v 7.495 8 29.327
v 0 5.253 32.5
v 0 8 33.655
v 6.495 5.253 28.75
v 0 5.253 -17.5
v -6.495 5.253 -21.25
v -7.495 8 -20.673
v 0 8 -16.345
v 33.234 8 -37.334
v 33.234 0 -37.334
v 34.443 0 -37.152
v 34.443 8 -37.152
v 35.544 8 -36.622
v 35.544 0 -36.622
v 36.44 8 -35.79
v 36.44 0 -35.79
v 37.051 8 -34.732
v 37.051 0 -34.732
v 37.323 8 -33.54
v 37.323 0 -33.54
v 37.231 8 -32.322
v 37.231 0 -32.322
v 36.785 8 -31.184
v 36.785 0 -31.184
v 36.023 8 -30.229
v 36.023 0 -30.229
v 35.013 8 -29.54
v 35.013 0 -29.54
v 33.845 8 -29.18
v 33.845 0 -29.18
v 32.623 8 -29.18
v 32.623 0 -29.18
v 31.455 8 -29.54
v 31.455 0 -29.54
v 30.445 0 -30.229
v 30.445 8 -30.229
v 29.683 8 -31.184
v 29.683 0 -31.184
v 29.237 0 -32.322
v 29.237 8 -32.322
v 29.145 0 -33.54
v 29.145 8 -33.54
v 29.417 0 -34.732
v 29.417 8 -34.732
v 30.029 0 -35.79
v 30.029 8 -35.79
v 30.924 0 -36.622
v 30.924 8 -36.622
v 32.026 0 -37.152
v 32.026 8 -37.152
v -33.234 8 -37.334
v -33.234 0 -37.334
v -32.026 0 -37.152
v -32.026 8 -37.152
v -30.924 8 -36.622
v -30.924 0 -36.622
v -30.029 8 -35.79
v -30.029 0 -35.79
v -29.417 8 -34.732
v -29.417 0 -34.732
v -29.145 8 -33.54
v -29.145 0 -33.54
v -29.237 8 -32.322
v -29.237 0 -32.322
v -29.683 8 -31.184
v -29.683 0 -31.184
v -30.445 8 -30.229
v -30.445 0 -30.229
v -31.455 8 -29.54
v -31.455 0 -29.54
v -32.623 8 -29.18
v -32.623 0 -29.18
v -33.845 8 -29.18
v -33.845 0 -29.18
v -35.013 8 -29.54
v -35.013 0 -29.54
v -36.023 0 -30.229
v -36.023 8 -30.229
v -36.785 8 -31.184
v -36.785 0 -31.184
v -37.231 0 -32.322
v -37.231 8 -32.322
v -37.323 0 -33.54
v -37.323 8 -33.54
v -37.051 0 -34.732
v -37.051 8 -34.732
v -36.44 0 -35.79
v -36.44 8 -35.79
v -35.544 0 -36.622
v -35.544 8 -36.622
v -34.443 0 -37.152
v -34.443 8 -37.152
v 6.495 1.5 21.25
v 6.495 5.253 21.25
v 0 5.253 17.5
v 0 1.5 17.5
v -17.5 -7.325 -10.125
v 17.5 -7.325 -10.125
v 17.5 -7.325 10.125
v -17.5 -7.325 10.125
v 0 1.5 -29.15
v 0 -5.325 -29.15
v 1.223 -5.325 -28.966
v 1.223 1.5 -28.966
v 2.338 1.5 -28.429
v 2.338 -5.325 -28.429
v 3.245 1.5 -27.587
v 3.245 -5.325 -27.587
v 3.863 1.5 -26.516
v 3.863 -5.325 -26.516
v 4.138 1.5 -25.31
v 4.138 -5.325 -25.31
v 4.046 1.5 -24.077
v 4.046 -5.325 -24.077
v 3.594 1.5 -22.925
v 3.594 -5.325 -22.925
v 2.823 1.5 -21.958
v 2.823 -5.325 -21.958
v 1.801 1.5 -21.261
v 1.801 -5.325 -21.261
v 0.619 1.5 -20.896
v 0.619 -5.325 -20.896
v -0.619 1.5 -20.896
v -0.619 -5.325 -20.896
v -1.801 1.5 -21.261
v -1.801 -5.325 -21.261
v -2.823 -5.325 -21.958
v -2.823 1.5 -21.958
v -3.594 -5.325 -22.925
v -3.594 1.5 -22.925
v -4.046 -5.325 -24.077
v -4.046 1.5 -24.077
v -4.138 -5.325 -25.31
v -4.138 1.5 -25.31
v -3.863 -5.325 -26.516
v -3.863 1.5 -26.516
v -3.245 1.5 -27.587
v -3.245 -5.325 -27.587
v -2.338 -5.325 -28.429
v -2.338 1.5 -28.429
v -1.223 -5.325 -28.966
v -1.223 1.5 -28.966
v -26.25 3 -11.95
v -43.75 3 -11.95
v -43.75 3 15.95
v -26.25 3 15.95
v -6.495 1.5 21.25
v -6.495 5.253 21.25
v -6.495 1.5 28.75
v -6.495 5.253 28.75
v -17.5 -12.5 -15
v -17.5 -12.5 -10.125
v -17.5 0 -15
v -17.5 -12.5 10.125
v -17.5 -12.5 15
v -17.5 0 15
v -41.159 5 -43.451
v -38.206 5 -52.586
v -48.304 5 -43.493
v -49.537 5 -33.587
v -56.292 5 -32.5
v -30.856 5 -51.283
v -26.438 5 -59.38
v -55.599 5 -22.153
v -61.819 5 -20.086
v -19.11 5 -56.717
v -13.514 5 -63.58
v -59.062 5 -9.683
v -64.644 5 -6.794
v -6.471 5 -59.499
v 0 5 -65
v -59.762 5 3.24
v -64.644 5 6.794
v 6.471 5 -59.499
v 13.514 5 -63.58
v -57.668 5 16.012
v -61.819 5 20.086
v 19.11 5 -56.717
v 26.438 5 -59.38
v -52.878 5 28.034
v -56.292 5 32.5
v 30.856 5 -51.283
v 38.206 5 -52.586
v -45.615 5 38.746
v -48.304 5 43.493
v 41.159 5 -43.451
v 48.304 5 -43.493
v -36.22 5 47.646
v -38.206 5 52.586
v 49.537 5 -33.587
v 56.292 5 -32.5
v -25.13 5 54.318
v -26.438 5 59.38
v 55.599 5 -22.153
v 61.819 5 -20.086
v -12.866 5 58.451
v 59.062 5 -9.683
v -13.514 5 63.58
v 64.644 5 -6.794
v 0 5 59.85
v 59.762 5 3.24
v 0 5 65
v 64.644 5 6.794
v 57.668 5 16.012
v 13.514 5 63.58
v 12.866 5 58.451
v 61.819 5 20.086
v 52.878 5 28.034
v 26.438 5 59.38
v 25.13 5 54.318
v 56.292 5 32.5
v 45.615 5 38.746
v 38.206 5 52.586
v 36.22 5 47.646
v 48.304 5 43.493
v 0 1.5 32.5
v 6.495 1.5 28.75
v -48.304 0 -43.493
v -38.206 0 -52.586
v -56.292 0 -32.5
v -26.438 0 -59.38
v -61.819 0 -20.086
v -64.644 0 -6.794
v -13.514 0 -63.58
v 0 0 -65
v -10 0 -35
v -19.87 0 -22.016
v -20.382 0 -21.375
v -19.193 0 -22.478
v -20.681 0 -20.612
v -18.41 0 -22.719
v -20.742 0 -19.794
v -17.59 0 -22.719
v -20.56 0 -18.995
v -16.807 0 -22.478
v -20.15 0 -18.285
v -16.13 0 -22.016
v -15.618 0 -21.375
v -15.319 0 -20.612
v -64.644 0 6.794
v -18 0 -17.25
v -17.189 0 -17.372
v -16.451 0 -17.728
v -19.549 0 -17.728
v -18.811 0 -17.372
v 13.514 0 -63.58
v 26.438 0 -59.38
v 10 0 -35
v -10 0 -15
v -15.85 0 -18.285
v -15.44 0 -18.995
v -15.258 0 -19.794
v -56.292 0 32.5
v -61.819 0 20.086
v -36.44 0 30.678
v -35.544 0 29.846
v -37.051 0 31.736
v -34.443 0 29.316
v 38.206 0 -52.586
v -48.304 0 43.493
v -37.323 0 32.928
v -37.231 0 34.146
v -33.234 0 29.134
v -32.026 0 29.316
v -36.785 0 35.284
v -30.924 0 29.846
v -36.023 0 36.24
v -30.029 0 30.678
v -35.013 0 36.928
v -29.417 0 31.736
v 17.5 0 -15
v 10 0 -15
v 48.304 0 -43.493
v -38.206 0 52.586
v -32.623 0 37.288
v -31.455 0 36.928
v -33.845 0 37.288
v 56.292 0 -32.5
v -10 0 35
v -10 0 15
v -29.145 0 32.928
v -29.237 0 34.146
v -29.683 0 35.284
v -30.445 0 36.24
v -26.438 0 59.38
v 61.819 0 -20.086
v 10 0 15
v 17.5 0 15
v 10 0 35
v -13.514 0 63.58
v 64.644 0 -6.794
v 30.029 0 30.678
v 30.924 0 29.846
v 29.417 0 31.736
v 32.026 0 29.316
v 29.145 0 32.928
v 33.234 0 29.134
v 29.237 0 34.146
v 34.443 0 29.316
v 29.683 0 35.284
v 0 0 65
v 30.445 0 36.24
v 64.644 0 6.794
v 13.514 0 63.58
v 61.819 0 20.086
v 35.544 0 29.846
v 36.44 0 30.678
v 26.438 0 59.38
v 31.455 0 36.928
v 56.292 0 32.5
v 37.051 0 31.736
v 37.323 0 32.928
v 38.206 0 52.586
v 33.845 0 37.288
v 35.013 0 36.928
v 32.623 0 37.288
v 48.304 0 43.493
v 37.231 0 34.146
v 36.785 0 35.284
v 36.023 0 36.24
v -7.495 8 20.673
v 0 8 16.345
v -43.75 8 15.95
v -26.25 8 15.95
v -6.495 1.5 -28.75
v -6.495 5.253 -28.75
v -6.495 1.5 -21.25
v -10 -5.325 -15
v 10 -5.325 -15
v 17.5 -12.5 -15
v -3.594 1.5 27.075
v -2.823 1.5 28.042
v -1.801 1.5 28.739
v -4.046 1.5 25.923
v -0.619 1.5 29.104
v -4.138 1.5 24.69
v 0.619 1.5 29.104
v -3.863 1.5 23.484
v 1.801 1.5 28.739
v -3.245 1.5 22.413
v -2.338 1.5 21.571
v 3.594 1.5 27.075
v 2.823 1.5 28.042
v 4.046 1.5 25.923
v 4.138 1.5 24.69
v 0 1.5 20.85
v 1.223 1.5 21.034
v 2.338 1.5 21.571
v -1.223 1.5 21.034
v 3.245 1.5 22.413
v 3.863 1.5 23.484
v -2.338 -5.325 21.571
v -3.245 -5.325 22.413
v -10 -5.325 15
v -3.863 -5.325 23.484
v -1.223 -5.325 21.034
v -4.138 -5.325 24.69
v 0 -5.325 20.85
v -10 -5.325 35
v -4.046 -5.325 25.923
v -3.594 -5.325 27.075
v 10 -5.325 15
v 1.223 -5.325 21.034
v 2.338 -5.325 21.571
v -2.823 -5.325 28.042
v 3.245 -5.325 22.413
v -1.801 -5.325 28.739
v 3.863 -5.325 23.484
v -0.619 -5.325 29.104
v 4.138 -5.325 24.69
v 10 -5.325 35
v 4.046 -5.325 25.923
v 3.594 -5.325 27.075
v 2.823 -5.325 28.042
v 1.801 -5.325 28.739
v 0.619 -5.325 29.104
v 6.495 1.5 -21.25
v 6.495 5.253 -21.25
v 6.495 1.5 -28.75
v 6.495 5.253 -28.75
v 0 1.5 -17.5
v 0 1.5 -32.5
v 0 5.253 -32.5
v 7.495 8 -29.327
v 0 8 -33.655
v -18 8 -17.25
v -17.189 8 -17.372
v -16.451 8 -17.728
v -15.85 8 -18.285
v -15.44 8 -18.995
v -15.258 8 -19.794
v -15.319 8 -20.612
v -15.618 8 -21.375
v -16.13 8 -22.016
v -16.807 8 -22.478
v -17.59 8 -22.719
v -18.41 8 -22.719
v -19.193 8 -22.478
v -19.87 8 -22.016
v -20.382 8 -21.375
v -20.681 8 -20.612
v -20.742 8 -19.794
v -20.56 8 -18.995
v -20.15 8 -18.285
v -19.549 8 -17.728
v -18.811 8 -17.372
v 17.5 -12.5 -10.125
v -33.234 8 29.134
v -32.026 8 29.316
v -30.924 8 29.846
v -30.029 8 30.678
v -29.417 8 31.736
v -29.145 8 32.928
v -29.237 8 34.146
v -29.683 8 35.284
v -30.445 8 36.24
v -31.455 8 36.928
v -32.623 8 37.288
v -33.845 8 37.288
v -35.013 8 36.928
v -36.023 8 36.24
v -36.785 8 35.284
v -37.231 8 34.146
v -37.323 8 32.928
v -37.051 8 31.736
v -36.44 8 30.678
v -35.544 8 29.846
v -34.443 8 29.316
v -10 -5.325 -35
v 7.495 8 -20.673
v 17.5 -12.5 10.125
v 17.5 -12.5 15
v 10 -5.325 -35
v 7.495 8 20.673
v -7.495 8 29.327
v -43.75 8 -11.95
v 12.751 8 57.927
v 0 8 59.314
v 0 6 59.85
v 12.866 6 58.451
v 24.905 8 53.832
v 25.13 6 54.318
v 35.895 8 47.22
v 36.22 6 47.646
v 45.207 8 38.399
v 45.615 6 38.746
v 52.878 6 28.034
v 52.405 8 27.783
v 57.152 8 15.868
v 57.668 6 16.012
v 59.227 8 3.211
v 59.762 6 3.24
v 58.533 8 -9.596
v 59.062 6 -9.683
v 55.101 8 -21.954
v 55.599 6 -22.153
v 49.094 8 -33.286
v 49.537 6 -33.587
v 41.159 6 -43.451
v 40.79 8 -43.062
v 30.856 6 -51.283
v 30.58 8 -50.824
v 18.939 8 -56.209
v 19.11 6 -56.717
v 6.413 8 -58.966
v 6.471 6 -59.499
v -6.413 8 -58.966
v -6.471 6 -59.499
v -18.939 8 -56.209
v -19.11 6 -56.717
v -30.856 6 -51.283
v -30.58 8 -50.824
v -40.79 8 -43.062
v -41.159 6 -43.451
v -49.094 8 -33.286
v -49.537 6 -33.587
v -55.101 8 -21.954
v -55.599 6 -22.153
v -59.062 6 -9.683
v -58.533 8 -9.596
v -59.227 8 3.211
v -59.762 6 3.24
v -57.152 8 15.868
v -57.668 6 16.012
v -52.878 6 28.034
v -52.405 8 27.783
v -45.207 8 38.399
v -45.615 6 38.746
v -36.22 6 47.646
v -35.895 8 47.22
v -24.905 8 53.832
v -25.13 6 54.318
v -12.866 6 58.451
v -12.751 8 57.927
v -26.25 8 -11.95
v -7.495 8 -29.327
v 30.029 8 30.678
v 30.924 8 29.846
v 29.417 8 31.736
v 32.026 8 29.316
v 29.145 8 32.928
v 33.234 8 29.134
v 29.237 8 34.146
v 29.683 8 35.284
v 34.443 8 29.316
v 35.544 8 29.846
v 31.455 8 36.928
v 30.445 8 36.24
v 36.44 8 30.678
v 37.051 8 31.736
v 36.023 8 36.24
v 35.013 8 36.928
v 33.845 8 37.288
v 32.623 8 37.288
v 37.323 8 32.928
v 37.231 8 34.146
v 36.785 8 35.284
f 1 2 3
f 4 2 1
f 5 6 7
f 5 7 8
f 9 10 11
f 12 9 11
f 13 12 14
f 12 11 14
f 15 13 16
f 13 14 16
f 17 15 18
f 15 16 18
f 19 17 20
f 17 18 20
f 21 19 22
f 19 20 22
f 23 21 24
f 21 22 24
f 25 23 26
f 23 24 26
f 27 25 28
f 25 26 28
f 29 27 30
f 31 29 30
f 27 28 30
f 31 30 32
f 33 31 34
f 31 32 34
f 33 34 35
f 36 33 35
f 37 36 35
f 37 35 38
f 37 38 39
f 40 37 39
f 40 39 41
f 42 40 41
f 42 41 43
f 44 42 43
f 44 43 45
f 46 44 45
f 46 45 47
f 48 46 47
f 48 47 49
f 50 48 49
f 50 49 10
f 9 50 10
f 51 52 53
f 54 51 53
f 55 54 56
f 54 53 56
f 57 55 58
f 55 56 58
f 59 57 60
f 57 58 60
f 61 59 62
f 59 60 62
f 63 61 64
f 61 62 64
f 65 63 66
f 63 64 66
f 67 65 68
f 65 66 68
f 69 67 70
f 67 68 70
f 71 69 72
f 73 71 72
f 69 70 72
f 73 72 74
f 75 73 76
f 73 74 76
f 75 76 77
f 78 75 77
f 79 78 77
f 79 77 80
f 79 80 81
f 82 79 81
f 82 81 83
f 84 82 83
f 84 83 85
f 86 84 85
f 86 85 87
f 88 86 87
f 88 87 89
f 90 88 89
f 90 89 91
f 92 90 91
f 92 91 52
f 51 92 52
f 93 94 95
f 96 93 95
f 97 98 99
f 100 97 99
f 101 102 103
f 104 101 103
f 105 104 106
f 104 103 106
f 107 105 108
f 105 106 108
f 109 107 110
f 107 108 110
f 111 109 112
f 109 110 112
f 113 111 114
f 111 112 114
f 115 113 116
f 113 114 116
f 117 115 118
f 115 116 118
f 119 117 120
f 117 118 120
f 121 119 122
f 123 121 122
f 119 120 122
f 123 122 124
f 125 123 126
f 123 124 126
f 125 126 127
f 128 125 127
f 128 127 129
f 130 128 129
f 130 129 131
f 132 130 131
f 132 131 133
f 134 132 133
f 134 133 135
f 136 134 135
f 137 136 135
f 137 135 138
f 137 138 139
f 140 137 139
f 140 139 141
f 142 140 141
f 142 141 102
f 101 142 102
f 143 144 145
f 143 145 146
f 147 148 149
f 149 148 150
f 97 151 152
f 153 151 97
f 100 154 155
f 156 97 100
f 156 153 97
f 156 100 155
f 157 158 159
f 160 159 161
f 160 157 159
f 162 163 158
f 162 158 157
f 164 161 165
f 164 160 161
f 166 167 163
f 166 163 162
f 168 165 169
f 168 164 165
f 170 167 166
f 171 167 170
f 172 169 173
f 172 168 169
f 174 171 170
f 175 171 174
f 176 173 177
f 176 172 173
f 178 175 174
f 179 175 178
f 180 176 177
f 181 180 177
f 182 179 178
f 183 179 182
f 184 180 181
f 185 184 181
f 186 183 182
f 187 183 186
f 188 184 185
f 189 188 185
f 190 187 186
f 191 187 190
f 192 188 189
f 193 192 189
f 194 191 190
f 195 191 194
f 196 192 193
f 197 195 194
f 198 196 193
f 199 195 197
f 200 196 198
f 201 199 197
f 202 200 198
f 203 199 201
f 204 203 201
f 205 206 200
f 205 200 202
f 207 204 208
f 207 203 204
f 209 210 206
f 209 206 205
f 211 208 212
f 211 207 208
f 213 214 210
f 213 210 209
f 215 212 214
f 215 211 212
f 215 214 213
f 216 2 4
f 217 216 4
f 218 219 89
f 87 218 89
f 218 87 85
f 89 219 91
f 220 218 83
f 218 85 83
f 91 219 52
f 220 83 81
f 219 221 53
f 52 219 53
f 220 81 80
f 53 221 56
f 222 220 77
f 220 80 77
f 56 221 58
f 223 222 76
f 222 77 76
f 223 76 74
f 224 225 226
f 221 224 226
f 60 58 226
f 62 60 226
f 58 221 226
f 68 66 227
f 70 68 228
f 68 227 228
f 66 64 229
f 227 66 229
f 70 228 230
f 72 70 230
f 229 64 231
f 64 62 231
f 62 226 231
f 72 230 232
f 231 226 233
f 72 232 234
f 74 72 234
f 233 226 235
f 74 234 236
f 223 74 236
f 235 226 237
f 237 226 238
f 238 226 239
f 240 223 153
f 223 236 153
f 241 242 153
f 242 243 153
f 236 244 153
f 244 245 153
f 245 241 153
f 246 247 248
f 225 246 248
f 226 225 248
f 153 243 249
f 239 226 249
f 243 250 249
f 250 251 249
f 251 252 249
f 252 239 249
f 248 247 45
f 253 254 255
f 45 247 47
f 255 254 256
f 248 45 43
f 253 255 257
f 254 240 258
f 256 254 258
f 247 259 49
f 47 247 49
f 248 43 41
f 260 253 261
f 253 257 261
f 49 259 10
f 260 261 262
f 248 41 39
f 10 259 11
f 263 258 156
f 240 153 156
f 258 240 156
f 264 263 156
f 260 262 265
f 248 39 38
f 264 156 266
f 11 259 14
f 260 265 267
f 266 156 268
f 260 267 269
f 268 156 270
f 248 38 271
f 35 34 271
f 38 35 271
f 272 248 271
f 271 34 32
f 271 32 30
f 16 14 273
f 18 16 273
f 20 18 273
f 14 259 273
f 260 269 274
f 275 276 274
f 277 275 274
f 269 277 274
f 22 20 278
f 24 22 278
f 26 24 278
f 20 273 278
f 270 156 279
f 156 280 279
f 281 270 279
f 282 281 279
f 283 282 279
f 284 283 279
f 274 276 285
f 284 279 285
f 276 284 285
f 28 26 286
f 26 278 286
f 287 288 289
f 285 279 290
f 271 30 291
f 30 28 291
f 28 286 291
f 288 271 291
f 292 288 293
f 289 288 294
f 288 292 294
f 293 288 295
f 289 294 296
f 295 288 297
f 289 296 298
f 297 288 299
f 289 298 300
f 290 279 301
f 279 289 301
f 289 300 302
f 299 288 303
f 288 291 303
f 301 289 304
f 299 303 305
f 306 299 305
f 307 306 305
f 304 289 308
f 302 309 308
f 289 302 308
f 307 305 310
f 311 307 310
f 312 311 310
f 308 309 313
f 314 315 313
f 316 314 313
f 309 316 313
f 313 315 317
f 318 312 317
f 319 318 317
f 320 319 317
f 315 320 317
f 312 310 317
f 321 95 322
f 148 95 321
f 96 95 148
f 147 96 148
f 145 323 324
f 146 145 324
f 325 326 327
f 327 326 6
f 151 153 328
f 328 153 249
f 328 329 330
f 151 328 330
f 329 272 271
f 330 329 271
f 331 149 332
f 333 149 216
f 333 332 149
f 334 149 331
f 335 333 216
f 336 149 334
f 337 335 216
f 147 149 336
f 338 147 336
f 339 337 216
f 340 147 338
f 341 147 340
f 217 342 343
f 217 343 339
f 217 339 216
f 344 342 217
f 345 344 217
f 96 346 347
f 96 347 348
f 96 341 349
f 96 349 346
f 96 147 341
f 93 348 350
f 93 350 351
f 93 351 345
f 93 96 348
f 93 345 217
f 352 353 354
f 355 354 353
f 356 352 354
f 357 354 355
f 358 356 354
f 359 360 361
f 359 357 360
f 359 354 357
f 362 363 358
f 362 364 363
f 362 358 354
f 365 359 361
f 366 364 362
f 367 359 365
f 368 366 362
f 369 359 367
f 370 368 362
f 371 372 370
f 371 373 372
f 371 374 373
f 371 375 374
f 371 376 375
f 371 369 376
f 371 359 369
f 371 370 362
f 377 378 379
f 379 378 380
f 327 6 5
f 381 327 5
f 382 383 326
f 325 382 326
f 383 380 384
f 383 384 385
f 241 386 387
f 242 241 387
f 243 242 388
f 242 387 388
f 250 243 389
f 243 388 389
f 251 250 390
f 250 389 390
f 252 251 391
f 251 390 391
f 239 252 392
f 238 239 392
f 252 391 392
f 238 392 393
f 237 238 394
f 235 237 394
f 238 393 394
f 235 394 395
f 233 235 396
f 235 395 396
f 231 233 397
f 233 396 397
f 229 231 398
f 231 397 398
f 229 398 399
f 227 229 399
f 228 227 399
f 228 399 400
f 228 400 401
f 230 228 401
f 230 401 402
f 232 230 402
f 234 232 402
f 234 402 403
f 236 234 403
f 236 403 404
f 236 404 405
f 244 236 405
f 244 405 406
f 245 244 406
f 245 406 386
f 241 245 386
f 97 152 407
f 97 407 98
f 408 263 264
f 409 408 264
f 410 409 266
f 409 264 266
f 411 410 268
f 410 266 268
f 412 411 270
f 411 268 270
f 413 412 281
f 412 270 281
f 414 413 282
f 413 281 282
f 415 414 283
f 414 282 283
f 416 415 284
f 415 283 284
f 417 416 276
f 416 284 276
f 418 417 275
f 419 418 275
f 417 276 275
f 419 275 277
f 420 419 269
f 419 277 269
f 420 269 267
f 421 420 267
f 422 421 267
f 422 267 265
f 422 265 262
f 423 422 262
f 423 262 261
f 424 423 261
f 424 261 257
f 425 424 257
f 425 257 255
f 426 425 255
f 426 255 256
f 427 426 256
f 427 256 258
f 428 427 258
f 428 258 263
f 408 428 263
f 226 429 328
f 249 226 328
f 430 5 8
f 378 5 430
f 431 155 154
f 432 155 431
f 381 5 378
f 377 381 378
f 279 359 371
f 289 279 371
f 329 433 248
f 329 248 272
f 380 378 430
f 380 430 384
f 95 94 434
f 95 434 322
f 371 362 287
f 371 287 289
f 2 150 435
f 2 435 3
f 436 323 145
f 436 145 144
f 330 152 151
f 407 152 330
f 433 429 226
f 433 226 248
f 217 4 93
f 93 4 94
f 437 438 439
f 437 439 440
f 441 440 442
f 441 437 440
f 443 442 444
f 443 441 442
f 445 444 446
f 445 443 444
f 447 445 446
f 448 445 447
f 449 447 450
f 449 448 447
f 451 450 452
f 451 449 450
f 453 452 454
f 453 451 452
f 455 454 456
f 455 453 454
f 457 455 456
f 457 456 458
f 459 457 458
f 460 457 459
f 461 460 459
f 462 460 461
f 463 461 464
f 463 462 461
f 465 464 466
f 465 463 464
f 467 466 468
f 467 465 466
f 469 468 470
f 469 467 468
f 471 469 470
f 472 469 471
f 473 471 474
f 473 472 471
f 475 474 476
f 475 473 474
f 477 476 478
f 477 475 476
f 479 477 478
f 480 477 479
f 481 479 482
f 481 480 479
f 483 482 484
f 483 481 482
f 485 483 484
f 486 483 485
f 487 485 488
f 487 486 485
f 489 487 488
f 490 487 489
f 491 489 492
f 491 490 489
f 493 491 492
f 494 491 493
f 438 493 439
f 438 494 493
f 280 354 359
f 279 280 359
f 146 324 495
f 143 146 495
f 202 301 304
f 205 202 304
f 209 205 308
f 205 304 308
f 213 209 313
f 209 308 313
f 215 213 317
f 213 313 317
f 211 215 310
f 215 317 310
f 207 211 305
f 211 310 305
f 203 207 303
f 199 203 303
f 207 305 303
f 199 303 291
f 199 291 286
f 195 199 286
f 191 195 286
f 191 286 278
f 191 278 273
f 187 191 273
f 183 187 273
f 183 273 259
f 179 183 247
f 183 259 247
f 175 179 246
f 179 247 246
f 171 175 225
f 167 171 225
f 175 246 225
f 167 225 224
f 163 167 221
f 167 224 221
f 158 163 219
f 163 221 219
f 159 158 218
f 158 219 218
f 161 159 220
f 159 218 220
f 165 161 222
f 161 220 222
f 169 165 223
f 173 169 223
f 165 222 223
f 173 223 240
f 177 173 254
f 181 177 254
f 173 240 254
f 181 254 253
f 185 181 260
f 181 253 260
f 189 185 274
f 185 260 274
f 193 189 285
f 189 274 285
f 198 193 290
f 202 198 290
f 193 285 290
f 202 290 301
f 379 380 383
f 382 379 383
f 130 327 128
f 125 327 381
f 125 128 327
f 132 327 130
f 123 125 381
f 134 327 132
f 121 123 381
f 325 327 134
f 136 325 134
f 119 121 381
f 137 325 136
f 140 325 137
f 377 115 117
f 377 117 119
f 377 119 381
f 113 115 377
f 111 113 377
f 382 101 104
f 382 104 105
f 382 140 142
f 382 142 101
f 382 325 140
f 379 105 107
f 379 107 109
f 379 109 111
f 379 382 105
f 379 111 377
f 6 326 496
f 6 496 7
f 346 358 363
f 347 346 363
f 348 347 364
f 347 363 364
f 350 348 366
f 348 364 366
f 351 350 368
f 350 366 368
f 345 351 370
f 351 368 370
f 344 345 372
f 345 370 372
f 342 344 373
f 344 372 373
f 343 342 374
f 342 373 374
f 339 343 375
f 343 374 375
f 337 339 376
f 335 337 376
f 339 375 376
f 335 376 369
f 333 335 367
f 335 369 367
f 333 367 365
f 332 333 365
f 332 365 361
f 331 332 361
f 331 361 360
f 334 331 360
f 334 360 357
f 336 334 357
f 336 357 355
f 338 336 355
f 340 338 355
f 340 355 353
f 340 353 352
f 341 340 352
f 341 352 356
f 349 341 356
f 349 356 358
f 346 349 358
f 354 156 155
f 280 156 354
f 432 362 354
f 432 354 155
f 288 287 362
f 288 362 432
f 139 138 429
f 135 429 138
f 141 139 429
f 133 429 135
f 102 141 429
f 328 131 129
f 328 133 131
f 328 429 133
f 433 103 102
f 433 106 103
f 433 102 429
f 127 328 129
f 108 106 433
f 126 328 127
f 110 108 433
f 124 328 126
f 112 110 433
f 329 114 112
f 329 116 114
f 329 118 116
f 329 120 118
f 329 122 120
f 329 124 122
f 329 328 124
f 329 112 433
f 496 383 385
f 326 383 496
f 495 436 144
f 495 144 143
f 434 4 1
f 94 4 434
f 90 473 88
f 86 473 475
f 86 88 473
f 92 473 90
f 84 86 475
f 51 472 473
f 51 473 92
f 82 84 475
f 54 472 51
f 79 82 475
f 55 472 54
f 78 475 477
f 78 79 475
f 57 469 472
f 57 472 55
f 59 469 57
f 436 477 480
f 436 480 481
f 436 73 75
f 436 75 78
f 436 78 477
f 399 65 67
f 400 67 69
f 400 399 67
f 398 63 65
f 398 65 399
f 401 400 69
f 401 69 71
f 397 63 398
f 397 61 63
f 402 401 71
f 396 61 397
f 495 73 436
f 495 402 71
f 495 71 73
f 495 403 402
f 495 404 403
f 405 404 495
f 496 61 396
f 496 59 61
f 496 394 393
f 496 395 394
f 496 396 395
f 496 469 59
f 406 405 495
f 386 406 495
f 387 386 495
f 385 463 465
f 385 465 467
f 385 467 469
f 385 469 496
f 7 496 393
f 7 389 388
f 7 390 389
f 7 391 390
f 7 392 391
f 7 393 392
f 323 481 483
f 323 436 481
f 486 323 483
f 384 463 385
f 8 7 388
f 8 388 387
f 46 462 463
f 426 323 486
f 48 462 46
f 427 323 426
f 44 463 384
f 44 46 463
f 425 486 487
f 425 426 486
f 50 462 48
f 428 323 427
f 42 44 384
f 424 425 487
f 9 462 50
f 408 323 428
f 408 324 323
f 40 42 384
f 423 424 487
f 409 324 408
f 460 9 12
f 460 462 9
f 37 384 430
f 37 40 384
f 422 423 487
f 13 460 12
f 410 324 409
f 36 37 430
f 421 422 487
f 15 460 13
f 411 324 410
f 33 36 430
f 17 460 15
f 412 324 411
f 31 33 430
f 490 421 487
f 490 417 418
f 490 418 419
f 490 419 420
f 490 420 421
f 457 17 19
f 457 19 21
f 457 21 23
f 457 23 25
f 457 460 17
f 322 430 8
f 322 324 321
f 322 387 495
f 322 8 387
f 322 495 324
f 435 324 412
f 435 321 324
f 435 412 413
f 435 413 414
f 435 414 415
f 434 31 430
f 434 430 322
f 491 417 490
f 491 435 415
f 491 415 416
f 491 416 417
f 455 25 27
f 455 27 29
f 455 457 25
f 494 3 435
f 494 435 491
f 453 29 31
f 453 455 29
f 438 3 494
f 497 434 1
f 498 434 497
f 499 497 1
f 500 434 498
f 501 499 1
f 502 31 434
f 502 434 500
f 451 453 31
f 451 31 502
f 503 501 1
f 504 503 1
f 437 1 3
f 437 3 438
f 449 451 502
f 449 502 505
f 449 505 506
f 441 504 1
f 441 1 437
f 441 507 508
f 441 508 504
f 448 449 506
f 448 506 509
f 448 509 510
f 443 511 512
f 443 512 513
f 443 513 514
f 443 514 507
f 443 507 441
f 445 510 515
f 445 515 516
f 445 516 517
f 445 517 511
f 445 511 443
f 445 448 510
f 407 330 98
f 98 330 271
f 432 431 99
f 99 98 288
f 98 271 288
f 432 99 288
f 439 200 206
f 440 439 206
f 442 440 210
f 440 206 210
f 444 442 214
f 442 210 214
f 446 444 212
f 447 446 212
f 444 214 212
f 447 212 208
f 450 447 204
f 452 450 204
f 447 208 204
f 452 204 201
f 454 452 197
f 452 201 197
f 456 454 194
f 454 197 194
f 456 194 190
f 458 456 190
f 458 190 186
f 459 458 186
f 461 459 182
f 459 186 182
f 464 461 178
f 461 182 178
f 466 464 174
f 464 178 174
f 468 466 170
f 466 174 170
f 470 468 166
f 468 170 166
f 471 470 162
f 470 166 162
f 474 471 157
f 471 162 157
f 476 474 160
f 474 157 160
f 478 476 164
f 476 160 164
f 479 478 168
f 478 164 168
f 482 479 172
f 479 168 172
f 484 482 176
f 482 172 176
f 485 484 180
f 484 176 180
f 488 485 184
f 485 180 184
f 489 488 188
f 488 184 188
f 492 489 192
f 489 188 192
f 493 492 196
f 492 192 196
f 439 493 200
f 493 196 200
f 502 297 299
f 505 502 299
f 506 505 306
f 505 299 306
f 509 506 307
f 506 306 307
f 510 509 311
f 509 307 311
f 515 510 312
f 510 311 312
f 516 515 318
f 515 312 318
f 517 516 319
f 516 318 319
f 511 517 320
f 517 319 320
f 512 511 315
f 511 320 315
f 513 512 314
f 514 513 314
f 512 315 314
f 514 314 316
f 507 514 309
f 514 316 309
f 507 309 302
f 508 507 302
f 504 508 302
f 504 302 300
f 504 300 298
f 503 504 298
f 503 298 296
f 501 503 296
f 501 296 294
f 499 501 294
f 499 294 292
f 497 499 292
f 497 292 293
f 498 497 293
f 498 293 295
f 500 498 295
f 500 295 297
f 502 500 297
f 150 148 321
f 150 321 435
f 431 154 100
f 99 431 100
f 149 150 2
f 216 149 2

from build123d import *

# Parameters (mm, degrees)
SKETCH_1_R          = 65
EXTRUDE_1_DEPTH     = 5
SKETCH_2_R          = 59.85
EXTRUDE_2_DEPTH     = 3
SKETCH_3_W          = 35
SKETCH_3_H          = 30
EXTRUDE_3_DEPTH     = 25
SKETCH_5_R          = 4.1
CUT_EXTRUDE_2_DEPTH = 96.262794416
SKETCH_6_R          = 2.75
CUT_EXTRUDE_3_DEPTH = 98.667804316
SKETCH2_W           = 20.25
SKETCH2_H           = 10.35
CUT_EXTRUDE1_DEPTH  = 108.964114408
CHAMFER1_SIZE       = 2
CHAMFER1_SIZE2      = 0.535898385
SKETCH4_W           = 35
SKETCH4_H           = 30
CUT_EXTRUDE3_DEPTH  = 12.5
BOSS_EXTRUDE2_START = -2
SKETCH5_W           = 20
SKETCH5_H           = 70
BOSS_EXTRUDE2_DEPTH = 5.325
SKETCH6_R           = 4.15
CUT_EXTRUDE4_DEPTH  = 93.884636108
CUT_EXTRUDE5_DEPTH  = 6.5
CHAMFER2_SIZE       = 1
CHAMFER2_SIZE2      = 2.747477419
SKETCH8_W           = 17.5
SKETCH8_H           = 27.9
CUT_EXTRUDE6_DEPTH  = 5


with BuildPart() as part:
    # Эскиз1 → Бобышка-Вытянуть1 (new body)
    with BuildSketch(Plane(origin=(0, 0, 0), x_dir=(1, 0, 0), z_dir=(0, 1, 0))):
        with Locations(Location((0, 0, 0), (0, 0, 270))):
            Circle(SKETCH_1_R)
    extrude(amount=EXTRUDE_1_DEPTH)

    # Эскиз2 → Бобышка-Вытянуть2 (add)
    with BuildSketch(Plane(origin=(0, 5, 0), x_dir=(1, 0, 0), z_dir=(0, 1, 0))):
        with Locations(Location((0, 0, 0), (0, 0, 270))):
            Circle(SKETCH_2_R)
    extrude(amount=EXTRUDE_2_DEPTH)

    # Эскиз3 → Бобышка-Вытянуть3 (add)
    with BuildSketch(Plane.XZ):
        Rectangle(SKETCH_3_W, SKETCH_3_H)
    extrude(amount=EXTRUDE_3_DEPTH)

    # Эскиз5 → Вырез-Вытянуть2 (cut, through all)
    with BuildSketch(Plane.XZ):
        with Locations(Location((33.234018716, -33.234018716, 0), (0, 0, 270))):
            Circle(SKETCH_5_R)
        with Locations(Location((-33.234018716, -33.234018716, 0), (0, 0, 270))):
            Circle(SKETCH_5_R)
        with Locations(Location((-33.234018716, 33.234018716, 0), (0, 0, 270))):
            Circle(SKETCH_5_R)
        with Locations(Location((33.234018716, 33.234018716, 0), (0, 0, 270))):
            Circle(SKETCH_5_R)
    extrude(amount=-CUT_EXTRUDE_2_DEPTH, mode=Mode.SUBTRACT)

    # Эскиз6 → Вырез-Вытянуть3 (cut, through all)
    with BuildSketch(Plane(origin=(0, 8, 0), x_dir=(1, 0, 0), z_dir=(0, 1, 0))):
        with Locations(Location((-18, 20, 0), (0, 0, 270))):
            Circle(SKETCH_6_R)
    extrude(amount=-CUT_EXTRUDE_3_DEPTH, mode=Mode.SUBTRACT)

    # Sketch2 → Cut-Extrude1 (cut, through all)
    with BuildSketch(Plane.ZY.offset(17.5)):
        with Locations((0, -12.5)):
            Rectangle(SKETCH2_W, SKETCH2_H)
    extrude(amount=-CUT_EXTRUDE1_DEPTH, mode=Mode.SUBTRACT)

    # Chamfer1
    chamfer1_edges = [part.edges().sort_by_distance(p)[0] for p in [
        (0, 8, -59.85),
    ]]
    chamfer1_side = [part.faces().sort_by_distance(p)[0] for p in [
        (0, 6.5, -59.85),
    ]]
    chamfer(chamfer1_edges, length=CHAMFER1_SIZE, length2=CHAMFER1_SIZE2, reference=chamfer1_side[0])

    # Sketch4 → Cut-Extrude3 (cut)
    with BuildSketch(Plane.XZ.offset(25)):
        Rectangle(SKETCH4_W, SKETCH4_H)
    extrude(amount=-CUT_EXTRUDE3_DEPTH, mode=Mode.SUBTRACT)

    # Sketch5 → Boss-Extrude2 (add)
    with BuildSketch(Plane.XZ.offset(7.325).offset(BOSS_EXTRUDE2_START)):
        Rectangle(SKETCH5_W, SKETCH5_H)
    extrude(amount=-BOSS_EXTRUDE2_DEPTH)

    # Sketch6 → Cut-Extrude4 (cut, through all)
    with BuildSketch(Plane.XZ.offset(5.325)):
        with Locations(Location((0, 25, 0), (0, 0, 270))):
            Circle(SKETCH6_R)
        with Locations(Location((0, -25, 0), (0, 0, 270))):
            Circle(SKETCH6_R)
    extrude(amount=-CUT_EXTRUDE4_DEPTH, mode=Mode.SUBTRACT)

    # Sketch7 → Cut-Extrude5 (cut)
    with BuildSketch(Plane(origin=(0, 8, 0), x_dir=(1, 0, 0), z_dir=(0, 1, 0))):
        Polygon((0, -32.5), (6.495190528, -28.75), (6.495190528, -21.25), (0, -17.5), (-6.495190528, -21.25), (-6.495190528, -28.75), align=None)
        Polygon((0, 17.5), (6.495190528, 21.25), (6.495190528, 28.75), (0, 32.5), (-6.495190528, 28.75), (-6.495190528, 21.25), align=None)
    extrude(amount=-CUT_EXTRUDE5_DEPTH, mode=Mode.SUBTRACT)

    # Chamfer2
    chamfer2_edges = [part.edges().sort_by_distance(p)[0] for p in [
        (-3.247595264, 8, 30.625),
        (3.247595264, 8, 30.625),
        (6.495190528, 8, 25),
        (3.247595264, 8, 19.375),
        (-3.247595264, 8, 19.375),
        (-6.495190528, 8, 25),
        (-3.247595264, 8, -19.375),
        (3.247595264, 8, -19.375),
        (6.495190528, 8, -25),
        (3.247595264, 8, -30.625),
        (-3.247595264, 8, -30.625),
        (-6.495190528, 8, -25),
    ]]
    chamfer2_side = [part.faces().sort_by_distance(p)[0] for p in [
        (0.040630406, 8, 0.045144896),
    ]]
    chamfer(chamfer2_edges, length=CHAMFER2_SIZE, length2=CHAMFER2_SIZE2, reference=chamfer2_side[0])

    # Sketch8 → Cut-Extrude6 (cut)
    with BuildSketch(Plane(origin=(0, 8, 0), x_dir=(1, 0, 0), z_dir=(0, 1, 0))):
        with Locations((-35, -2)):
            Rectangle(SKETCH8_W, SKETCH8_H)
    extrude(amount=-CUT_EXTRUDE6_DEPTH, mode=Mode.SUBTRACT)


solid = part.part
